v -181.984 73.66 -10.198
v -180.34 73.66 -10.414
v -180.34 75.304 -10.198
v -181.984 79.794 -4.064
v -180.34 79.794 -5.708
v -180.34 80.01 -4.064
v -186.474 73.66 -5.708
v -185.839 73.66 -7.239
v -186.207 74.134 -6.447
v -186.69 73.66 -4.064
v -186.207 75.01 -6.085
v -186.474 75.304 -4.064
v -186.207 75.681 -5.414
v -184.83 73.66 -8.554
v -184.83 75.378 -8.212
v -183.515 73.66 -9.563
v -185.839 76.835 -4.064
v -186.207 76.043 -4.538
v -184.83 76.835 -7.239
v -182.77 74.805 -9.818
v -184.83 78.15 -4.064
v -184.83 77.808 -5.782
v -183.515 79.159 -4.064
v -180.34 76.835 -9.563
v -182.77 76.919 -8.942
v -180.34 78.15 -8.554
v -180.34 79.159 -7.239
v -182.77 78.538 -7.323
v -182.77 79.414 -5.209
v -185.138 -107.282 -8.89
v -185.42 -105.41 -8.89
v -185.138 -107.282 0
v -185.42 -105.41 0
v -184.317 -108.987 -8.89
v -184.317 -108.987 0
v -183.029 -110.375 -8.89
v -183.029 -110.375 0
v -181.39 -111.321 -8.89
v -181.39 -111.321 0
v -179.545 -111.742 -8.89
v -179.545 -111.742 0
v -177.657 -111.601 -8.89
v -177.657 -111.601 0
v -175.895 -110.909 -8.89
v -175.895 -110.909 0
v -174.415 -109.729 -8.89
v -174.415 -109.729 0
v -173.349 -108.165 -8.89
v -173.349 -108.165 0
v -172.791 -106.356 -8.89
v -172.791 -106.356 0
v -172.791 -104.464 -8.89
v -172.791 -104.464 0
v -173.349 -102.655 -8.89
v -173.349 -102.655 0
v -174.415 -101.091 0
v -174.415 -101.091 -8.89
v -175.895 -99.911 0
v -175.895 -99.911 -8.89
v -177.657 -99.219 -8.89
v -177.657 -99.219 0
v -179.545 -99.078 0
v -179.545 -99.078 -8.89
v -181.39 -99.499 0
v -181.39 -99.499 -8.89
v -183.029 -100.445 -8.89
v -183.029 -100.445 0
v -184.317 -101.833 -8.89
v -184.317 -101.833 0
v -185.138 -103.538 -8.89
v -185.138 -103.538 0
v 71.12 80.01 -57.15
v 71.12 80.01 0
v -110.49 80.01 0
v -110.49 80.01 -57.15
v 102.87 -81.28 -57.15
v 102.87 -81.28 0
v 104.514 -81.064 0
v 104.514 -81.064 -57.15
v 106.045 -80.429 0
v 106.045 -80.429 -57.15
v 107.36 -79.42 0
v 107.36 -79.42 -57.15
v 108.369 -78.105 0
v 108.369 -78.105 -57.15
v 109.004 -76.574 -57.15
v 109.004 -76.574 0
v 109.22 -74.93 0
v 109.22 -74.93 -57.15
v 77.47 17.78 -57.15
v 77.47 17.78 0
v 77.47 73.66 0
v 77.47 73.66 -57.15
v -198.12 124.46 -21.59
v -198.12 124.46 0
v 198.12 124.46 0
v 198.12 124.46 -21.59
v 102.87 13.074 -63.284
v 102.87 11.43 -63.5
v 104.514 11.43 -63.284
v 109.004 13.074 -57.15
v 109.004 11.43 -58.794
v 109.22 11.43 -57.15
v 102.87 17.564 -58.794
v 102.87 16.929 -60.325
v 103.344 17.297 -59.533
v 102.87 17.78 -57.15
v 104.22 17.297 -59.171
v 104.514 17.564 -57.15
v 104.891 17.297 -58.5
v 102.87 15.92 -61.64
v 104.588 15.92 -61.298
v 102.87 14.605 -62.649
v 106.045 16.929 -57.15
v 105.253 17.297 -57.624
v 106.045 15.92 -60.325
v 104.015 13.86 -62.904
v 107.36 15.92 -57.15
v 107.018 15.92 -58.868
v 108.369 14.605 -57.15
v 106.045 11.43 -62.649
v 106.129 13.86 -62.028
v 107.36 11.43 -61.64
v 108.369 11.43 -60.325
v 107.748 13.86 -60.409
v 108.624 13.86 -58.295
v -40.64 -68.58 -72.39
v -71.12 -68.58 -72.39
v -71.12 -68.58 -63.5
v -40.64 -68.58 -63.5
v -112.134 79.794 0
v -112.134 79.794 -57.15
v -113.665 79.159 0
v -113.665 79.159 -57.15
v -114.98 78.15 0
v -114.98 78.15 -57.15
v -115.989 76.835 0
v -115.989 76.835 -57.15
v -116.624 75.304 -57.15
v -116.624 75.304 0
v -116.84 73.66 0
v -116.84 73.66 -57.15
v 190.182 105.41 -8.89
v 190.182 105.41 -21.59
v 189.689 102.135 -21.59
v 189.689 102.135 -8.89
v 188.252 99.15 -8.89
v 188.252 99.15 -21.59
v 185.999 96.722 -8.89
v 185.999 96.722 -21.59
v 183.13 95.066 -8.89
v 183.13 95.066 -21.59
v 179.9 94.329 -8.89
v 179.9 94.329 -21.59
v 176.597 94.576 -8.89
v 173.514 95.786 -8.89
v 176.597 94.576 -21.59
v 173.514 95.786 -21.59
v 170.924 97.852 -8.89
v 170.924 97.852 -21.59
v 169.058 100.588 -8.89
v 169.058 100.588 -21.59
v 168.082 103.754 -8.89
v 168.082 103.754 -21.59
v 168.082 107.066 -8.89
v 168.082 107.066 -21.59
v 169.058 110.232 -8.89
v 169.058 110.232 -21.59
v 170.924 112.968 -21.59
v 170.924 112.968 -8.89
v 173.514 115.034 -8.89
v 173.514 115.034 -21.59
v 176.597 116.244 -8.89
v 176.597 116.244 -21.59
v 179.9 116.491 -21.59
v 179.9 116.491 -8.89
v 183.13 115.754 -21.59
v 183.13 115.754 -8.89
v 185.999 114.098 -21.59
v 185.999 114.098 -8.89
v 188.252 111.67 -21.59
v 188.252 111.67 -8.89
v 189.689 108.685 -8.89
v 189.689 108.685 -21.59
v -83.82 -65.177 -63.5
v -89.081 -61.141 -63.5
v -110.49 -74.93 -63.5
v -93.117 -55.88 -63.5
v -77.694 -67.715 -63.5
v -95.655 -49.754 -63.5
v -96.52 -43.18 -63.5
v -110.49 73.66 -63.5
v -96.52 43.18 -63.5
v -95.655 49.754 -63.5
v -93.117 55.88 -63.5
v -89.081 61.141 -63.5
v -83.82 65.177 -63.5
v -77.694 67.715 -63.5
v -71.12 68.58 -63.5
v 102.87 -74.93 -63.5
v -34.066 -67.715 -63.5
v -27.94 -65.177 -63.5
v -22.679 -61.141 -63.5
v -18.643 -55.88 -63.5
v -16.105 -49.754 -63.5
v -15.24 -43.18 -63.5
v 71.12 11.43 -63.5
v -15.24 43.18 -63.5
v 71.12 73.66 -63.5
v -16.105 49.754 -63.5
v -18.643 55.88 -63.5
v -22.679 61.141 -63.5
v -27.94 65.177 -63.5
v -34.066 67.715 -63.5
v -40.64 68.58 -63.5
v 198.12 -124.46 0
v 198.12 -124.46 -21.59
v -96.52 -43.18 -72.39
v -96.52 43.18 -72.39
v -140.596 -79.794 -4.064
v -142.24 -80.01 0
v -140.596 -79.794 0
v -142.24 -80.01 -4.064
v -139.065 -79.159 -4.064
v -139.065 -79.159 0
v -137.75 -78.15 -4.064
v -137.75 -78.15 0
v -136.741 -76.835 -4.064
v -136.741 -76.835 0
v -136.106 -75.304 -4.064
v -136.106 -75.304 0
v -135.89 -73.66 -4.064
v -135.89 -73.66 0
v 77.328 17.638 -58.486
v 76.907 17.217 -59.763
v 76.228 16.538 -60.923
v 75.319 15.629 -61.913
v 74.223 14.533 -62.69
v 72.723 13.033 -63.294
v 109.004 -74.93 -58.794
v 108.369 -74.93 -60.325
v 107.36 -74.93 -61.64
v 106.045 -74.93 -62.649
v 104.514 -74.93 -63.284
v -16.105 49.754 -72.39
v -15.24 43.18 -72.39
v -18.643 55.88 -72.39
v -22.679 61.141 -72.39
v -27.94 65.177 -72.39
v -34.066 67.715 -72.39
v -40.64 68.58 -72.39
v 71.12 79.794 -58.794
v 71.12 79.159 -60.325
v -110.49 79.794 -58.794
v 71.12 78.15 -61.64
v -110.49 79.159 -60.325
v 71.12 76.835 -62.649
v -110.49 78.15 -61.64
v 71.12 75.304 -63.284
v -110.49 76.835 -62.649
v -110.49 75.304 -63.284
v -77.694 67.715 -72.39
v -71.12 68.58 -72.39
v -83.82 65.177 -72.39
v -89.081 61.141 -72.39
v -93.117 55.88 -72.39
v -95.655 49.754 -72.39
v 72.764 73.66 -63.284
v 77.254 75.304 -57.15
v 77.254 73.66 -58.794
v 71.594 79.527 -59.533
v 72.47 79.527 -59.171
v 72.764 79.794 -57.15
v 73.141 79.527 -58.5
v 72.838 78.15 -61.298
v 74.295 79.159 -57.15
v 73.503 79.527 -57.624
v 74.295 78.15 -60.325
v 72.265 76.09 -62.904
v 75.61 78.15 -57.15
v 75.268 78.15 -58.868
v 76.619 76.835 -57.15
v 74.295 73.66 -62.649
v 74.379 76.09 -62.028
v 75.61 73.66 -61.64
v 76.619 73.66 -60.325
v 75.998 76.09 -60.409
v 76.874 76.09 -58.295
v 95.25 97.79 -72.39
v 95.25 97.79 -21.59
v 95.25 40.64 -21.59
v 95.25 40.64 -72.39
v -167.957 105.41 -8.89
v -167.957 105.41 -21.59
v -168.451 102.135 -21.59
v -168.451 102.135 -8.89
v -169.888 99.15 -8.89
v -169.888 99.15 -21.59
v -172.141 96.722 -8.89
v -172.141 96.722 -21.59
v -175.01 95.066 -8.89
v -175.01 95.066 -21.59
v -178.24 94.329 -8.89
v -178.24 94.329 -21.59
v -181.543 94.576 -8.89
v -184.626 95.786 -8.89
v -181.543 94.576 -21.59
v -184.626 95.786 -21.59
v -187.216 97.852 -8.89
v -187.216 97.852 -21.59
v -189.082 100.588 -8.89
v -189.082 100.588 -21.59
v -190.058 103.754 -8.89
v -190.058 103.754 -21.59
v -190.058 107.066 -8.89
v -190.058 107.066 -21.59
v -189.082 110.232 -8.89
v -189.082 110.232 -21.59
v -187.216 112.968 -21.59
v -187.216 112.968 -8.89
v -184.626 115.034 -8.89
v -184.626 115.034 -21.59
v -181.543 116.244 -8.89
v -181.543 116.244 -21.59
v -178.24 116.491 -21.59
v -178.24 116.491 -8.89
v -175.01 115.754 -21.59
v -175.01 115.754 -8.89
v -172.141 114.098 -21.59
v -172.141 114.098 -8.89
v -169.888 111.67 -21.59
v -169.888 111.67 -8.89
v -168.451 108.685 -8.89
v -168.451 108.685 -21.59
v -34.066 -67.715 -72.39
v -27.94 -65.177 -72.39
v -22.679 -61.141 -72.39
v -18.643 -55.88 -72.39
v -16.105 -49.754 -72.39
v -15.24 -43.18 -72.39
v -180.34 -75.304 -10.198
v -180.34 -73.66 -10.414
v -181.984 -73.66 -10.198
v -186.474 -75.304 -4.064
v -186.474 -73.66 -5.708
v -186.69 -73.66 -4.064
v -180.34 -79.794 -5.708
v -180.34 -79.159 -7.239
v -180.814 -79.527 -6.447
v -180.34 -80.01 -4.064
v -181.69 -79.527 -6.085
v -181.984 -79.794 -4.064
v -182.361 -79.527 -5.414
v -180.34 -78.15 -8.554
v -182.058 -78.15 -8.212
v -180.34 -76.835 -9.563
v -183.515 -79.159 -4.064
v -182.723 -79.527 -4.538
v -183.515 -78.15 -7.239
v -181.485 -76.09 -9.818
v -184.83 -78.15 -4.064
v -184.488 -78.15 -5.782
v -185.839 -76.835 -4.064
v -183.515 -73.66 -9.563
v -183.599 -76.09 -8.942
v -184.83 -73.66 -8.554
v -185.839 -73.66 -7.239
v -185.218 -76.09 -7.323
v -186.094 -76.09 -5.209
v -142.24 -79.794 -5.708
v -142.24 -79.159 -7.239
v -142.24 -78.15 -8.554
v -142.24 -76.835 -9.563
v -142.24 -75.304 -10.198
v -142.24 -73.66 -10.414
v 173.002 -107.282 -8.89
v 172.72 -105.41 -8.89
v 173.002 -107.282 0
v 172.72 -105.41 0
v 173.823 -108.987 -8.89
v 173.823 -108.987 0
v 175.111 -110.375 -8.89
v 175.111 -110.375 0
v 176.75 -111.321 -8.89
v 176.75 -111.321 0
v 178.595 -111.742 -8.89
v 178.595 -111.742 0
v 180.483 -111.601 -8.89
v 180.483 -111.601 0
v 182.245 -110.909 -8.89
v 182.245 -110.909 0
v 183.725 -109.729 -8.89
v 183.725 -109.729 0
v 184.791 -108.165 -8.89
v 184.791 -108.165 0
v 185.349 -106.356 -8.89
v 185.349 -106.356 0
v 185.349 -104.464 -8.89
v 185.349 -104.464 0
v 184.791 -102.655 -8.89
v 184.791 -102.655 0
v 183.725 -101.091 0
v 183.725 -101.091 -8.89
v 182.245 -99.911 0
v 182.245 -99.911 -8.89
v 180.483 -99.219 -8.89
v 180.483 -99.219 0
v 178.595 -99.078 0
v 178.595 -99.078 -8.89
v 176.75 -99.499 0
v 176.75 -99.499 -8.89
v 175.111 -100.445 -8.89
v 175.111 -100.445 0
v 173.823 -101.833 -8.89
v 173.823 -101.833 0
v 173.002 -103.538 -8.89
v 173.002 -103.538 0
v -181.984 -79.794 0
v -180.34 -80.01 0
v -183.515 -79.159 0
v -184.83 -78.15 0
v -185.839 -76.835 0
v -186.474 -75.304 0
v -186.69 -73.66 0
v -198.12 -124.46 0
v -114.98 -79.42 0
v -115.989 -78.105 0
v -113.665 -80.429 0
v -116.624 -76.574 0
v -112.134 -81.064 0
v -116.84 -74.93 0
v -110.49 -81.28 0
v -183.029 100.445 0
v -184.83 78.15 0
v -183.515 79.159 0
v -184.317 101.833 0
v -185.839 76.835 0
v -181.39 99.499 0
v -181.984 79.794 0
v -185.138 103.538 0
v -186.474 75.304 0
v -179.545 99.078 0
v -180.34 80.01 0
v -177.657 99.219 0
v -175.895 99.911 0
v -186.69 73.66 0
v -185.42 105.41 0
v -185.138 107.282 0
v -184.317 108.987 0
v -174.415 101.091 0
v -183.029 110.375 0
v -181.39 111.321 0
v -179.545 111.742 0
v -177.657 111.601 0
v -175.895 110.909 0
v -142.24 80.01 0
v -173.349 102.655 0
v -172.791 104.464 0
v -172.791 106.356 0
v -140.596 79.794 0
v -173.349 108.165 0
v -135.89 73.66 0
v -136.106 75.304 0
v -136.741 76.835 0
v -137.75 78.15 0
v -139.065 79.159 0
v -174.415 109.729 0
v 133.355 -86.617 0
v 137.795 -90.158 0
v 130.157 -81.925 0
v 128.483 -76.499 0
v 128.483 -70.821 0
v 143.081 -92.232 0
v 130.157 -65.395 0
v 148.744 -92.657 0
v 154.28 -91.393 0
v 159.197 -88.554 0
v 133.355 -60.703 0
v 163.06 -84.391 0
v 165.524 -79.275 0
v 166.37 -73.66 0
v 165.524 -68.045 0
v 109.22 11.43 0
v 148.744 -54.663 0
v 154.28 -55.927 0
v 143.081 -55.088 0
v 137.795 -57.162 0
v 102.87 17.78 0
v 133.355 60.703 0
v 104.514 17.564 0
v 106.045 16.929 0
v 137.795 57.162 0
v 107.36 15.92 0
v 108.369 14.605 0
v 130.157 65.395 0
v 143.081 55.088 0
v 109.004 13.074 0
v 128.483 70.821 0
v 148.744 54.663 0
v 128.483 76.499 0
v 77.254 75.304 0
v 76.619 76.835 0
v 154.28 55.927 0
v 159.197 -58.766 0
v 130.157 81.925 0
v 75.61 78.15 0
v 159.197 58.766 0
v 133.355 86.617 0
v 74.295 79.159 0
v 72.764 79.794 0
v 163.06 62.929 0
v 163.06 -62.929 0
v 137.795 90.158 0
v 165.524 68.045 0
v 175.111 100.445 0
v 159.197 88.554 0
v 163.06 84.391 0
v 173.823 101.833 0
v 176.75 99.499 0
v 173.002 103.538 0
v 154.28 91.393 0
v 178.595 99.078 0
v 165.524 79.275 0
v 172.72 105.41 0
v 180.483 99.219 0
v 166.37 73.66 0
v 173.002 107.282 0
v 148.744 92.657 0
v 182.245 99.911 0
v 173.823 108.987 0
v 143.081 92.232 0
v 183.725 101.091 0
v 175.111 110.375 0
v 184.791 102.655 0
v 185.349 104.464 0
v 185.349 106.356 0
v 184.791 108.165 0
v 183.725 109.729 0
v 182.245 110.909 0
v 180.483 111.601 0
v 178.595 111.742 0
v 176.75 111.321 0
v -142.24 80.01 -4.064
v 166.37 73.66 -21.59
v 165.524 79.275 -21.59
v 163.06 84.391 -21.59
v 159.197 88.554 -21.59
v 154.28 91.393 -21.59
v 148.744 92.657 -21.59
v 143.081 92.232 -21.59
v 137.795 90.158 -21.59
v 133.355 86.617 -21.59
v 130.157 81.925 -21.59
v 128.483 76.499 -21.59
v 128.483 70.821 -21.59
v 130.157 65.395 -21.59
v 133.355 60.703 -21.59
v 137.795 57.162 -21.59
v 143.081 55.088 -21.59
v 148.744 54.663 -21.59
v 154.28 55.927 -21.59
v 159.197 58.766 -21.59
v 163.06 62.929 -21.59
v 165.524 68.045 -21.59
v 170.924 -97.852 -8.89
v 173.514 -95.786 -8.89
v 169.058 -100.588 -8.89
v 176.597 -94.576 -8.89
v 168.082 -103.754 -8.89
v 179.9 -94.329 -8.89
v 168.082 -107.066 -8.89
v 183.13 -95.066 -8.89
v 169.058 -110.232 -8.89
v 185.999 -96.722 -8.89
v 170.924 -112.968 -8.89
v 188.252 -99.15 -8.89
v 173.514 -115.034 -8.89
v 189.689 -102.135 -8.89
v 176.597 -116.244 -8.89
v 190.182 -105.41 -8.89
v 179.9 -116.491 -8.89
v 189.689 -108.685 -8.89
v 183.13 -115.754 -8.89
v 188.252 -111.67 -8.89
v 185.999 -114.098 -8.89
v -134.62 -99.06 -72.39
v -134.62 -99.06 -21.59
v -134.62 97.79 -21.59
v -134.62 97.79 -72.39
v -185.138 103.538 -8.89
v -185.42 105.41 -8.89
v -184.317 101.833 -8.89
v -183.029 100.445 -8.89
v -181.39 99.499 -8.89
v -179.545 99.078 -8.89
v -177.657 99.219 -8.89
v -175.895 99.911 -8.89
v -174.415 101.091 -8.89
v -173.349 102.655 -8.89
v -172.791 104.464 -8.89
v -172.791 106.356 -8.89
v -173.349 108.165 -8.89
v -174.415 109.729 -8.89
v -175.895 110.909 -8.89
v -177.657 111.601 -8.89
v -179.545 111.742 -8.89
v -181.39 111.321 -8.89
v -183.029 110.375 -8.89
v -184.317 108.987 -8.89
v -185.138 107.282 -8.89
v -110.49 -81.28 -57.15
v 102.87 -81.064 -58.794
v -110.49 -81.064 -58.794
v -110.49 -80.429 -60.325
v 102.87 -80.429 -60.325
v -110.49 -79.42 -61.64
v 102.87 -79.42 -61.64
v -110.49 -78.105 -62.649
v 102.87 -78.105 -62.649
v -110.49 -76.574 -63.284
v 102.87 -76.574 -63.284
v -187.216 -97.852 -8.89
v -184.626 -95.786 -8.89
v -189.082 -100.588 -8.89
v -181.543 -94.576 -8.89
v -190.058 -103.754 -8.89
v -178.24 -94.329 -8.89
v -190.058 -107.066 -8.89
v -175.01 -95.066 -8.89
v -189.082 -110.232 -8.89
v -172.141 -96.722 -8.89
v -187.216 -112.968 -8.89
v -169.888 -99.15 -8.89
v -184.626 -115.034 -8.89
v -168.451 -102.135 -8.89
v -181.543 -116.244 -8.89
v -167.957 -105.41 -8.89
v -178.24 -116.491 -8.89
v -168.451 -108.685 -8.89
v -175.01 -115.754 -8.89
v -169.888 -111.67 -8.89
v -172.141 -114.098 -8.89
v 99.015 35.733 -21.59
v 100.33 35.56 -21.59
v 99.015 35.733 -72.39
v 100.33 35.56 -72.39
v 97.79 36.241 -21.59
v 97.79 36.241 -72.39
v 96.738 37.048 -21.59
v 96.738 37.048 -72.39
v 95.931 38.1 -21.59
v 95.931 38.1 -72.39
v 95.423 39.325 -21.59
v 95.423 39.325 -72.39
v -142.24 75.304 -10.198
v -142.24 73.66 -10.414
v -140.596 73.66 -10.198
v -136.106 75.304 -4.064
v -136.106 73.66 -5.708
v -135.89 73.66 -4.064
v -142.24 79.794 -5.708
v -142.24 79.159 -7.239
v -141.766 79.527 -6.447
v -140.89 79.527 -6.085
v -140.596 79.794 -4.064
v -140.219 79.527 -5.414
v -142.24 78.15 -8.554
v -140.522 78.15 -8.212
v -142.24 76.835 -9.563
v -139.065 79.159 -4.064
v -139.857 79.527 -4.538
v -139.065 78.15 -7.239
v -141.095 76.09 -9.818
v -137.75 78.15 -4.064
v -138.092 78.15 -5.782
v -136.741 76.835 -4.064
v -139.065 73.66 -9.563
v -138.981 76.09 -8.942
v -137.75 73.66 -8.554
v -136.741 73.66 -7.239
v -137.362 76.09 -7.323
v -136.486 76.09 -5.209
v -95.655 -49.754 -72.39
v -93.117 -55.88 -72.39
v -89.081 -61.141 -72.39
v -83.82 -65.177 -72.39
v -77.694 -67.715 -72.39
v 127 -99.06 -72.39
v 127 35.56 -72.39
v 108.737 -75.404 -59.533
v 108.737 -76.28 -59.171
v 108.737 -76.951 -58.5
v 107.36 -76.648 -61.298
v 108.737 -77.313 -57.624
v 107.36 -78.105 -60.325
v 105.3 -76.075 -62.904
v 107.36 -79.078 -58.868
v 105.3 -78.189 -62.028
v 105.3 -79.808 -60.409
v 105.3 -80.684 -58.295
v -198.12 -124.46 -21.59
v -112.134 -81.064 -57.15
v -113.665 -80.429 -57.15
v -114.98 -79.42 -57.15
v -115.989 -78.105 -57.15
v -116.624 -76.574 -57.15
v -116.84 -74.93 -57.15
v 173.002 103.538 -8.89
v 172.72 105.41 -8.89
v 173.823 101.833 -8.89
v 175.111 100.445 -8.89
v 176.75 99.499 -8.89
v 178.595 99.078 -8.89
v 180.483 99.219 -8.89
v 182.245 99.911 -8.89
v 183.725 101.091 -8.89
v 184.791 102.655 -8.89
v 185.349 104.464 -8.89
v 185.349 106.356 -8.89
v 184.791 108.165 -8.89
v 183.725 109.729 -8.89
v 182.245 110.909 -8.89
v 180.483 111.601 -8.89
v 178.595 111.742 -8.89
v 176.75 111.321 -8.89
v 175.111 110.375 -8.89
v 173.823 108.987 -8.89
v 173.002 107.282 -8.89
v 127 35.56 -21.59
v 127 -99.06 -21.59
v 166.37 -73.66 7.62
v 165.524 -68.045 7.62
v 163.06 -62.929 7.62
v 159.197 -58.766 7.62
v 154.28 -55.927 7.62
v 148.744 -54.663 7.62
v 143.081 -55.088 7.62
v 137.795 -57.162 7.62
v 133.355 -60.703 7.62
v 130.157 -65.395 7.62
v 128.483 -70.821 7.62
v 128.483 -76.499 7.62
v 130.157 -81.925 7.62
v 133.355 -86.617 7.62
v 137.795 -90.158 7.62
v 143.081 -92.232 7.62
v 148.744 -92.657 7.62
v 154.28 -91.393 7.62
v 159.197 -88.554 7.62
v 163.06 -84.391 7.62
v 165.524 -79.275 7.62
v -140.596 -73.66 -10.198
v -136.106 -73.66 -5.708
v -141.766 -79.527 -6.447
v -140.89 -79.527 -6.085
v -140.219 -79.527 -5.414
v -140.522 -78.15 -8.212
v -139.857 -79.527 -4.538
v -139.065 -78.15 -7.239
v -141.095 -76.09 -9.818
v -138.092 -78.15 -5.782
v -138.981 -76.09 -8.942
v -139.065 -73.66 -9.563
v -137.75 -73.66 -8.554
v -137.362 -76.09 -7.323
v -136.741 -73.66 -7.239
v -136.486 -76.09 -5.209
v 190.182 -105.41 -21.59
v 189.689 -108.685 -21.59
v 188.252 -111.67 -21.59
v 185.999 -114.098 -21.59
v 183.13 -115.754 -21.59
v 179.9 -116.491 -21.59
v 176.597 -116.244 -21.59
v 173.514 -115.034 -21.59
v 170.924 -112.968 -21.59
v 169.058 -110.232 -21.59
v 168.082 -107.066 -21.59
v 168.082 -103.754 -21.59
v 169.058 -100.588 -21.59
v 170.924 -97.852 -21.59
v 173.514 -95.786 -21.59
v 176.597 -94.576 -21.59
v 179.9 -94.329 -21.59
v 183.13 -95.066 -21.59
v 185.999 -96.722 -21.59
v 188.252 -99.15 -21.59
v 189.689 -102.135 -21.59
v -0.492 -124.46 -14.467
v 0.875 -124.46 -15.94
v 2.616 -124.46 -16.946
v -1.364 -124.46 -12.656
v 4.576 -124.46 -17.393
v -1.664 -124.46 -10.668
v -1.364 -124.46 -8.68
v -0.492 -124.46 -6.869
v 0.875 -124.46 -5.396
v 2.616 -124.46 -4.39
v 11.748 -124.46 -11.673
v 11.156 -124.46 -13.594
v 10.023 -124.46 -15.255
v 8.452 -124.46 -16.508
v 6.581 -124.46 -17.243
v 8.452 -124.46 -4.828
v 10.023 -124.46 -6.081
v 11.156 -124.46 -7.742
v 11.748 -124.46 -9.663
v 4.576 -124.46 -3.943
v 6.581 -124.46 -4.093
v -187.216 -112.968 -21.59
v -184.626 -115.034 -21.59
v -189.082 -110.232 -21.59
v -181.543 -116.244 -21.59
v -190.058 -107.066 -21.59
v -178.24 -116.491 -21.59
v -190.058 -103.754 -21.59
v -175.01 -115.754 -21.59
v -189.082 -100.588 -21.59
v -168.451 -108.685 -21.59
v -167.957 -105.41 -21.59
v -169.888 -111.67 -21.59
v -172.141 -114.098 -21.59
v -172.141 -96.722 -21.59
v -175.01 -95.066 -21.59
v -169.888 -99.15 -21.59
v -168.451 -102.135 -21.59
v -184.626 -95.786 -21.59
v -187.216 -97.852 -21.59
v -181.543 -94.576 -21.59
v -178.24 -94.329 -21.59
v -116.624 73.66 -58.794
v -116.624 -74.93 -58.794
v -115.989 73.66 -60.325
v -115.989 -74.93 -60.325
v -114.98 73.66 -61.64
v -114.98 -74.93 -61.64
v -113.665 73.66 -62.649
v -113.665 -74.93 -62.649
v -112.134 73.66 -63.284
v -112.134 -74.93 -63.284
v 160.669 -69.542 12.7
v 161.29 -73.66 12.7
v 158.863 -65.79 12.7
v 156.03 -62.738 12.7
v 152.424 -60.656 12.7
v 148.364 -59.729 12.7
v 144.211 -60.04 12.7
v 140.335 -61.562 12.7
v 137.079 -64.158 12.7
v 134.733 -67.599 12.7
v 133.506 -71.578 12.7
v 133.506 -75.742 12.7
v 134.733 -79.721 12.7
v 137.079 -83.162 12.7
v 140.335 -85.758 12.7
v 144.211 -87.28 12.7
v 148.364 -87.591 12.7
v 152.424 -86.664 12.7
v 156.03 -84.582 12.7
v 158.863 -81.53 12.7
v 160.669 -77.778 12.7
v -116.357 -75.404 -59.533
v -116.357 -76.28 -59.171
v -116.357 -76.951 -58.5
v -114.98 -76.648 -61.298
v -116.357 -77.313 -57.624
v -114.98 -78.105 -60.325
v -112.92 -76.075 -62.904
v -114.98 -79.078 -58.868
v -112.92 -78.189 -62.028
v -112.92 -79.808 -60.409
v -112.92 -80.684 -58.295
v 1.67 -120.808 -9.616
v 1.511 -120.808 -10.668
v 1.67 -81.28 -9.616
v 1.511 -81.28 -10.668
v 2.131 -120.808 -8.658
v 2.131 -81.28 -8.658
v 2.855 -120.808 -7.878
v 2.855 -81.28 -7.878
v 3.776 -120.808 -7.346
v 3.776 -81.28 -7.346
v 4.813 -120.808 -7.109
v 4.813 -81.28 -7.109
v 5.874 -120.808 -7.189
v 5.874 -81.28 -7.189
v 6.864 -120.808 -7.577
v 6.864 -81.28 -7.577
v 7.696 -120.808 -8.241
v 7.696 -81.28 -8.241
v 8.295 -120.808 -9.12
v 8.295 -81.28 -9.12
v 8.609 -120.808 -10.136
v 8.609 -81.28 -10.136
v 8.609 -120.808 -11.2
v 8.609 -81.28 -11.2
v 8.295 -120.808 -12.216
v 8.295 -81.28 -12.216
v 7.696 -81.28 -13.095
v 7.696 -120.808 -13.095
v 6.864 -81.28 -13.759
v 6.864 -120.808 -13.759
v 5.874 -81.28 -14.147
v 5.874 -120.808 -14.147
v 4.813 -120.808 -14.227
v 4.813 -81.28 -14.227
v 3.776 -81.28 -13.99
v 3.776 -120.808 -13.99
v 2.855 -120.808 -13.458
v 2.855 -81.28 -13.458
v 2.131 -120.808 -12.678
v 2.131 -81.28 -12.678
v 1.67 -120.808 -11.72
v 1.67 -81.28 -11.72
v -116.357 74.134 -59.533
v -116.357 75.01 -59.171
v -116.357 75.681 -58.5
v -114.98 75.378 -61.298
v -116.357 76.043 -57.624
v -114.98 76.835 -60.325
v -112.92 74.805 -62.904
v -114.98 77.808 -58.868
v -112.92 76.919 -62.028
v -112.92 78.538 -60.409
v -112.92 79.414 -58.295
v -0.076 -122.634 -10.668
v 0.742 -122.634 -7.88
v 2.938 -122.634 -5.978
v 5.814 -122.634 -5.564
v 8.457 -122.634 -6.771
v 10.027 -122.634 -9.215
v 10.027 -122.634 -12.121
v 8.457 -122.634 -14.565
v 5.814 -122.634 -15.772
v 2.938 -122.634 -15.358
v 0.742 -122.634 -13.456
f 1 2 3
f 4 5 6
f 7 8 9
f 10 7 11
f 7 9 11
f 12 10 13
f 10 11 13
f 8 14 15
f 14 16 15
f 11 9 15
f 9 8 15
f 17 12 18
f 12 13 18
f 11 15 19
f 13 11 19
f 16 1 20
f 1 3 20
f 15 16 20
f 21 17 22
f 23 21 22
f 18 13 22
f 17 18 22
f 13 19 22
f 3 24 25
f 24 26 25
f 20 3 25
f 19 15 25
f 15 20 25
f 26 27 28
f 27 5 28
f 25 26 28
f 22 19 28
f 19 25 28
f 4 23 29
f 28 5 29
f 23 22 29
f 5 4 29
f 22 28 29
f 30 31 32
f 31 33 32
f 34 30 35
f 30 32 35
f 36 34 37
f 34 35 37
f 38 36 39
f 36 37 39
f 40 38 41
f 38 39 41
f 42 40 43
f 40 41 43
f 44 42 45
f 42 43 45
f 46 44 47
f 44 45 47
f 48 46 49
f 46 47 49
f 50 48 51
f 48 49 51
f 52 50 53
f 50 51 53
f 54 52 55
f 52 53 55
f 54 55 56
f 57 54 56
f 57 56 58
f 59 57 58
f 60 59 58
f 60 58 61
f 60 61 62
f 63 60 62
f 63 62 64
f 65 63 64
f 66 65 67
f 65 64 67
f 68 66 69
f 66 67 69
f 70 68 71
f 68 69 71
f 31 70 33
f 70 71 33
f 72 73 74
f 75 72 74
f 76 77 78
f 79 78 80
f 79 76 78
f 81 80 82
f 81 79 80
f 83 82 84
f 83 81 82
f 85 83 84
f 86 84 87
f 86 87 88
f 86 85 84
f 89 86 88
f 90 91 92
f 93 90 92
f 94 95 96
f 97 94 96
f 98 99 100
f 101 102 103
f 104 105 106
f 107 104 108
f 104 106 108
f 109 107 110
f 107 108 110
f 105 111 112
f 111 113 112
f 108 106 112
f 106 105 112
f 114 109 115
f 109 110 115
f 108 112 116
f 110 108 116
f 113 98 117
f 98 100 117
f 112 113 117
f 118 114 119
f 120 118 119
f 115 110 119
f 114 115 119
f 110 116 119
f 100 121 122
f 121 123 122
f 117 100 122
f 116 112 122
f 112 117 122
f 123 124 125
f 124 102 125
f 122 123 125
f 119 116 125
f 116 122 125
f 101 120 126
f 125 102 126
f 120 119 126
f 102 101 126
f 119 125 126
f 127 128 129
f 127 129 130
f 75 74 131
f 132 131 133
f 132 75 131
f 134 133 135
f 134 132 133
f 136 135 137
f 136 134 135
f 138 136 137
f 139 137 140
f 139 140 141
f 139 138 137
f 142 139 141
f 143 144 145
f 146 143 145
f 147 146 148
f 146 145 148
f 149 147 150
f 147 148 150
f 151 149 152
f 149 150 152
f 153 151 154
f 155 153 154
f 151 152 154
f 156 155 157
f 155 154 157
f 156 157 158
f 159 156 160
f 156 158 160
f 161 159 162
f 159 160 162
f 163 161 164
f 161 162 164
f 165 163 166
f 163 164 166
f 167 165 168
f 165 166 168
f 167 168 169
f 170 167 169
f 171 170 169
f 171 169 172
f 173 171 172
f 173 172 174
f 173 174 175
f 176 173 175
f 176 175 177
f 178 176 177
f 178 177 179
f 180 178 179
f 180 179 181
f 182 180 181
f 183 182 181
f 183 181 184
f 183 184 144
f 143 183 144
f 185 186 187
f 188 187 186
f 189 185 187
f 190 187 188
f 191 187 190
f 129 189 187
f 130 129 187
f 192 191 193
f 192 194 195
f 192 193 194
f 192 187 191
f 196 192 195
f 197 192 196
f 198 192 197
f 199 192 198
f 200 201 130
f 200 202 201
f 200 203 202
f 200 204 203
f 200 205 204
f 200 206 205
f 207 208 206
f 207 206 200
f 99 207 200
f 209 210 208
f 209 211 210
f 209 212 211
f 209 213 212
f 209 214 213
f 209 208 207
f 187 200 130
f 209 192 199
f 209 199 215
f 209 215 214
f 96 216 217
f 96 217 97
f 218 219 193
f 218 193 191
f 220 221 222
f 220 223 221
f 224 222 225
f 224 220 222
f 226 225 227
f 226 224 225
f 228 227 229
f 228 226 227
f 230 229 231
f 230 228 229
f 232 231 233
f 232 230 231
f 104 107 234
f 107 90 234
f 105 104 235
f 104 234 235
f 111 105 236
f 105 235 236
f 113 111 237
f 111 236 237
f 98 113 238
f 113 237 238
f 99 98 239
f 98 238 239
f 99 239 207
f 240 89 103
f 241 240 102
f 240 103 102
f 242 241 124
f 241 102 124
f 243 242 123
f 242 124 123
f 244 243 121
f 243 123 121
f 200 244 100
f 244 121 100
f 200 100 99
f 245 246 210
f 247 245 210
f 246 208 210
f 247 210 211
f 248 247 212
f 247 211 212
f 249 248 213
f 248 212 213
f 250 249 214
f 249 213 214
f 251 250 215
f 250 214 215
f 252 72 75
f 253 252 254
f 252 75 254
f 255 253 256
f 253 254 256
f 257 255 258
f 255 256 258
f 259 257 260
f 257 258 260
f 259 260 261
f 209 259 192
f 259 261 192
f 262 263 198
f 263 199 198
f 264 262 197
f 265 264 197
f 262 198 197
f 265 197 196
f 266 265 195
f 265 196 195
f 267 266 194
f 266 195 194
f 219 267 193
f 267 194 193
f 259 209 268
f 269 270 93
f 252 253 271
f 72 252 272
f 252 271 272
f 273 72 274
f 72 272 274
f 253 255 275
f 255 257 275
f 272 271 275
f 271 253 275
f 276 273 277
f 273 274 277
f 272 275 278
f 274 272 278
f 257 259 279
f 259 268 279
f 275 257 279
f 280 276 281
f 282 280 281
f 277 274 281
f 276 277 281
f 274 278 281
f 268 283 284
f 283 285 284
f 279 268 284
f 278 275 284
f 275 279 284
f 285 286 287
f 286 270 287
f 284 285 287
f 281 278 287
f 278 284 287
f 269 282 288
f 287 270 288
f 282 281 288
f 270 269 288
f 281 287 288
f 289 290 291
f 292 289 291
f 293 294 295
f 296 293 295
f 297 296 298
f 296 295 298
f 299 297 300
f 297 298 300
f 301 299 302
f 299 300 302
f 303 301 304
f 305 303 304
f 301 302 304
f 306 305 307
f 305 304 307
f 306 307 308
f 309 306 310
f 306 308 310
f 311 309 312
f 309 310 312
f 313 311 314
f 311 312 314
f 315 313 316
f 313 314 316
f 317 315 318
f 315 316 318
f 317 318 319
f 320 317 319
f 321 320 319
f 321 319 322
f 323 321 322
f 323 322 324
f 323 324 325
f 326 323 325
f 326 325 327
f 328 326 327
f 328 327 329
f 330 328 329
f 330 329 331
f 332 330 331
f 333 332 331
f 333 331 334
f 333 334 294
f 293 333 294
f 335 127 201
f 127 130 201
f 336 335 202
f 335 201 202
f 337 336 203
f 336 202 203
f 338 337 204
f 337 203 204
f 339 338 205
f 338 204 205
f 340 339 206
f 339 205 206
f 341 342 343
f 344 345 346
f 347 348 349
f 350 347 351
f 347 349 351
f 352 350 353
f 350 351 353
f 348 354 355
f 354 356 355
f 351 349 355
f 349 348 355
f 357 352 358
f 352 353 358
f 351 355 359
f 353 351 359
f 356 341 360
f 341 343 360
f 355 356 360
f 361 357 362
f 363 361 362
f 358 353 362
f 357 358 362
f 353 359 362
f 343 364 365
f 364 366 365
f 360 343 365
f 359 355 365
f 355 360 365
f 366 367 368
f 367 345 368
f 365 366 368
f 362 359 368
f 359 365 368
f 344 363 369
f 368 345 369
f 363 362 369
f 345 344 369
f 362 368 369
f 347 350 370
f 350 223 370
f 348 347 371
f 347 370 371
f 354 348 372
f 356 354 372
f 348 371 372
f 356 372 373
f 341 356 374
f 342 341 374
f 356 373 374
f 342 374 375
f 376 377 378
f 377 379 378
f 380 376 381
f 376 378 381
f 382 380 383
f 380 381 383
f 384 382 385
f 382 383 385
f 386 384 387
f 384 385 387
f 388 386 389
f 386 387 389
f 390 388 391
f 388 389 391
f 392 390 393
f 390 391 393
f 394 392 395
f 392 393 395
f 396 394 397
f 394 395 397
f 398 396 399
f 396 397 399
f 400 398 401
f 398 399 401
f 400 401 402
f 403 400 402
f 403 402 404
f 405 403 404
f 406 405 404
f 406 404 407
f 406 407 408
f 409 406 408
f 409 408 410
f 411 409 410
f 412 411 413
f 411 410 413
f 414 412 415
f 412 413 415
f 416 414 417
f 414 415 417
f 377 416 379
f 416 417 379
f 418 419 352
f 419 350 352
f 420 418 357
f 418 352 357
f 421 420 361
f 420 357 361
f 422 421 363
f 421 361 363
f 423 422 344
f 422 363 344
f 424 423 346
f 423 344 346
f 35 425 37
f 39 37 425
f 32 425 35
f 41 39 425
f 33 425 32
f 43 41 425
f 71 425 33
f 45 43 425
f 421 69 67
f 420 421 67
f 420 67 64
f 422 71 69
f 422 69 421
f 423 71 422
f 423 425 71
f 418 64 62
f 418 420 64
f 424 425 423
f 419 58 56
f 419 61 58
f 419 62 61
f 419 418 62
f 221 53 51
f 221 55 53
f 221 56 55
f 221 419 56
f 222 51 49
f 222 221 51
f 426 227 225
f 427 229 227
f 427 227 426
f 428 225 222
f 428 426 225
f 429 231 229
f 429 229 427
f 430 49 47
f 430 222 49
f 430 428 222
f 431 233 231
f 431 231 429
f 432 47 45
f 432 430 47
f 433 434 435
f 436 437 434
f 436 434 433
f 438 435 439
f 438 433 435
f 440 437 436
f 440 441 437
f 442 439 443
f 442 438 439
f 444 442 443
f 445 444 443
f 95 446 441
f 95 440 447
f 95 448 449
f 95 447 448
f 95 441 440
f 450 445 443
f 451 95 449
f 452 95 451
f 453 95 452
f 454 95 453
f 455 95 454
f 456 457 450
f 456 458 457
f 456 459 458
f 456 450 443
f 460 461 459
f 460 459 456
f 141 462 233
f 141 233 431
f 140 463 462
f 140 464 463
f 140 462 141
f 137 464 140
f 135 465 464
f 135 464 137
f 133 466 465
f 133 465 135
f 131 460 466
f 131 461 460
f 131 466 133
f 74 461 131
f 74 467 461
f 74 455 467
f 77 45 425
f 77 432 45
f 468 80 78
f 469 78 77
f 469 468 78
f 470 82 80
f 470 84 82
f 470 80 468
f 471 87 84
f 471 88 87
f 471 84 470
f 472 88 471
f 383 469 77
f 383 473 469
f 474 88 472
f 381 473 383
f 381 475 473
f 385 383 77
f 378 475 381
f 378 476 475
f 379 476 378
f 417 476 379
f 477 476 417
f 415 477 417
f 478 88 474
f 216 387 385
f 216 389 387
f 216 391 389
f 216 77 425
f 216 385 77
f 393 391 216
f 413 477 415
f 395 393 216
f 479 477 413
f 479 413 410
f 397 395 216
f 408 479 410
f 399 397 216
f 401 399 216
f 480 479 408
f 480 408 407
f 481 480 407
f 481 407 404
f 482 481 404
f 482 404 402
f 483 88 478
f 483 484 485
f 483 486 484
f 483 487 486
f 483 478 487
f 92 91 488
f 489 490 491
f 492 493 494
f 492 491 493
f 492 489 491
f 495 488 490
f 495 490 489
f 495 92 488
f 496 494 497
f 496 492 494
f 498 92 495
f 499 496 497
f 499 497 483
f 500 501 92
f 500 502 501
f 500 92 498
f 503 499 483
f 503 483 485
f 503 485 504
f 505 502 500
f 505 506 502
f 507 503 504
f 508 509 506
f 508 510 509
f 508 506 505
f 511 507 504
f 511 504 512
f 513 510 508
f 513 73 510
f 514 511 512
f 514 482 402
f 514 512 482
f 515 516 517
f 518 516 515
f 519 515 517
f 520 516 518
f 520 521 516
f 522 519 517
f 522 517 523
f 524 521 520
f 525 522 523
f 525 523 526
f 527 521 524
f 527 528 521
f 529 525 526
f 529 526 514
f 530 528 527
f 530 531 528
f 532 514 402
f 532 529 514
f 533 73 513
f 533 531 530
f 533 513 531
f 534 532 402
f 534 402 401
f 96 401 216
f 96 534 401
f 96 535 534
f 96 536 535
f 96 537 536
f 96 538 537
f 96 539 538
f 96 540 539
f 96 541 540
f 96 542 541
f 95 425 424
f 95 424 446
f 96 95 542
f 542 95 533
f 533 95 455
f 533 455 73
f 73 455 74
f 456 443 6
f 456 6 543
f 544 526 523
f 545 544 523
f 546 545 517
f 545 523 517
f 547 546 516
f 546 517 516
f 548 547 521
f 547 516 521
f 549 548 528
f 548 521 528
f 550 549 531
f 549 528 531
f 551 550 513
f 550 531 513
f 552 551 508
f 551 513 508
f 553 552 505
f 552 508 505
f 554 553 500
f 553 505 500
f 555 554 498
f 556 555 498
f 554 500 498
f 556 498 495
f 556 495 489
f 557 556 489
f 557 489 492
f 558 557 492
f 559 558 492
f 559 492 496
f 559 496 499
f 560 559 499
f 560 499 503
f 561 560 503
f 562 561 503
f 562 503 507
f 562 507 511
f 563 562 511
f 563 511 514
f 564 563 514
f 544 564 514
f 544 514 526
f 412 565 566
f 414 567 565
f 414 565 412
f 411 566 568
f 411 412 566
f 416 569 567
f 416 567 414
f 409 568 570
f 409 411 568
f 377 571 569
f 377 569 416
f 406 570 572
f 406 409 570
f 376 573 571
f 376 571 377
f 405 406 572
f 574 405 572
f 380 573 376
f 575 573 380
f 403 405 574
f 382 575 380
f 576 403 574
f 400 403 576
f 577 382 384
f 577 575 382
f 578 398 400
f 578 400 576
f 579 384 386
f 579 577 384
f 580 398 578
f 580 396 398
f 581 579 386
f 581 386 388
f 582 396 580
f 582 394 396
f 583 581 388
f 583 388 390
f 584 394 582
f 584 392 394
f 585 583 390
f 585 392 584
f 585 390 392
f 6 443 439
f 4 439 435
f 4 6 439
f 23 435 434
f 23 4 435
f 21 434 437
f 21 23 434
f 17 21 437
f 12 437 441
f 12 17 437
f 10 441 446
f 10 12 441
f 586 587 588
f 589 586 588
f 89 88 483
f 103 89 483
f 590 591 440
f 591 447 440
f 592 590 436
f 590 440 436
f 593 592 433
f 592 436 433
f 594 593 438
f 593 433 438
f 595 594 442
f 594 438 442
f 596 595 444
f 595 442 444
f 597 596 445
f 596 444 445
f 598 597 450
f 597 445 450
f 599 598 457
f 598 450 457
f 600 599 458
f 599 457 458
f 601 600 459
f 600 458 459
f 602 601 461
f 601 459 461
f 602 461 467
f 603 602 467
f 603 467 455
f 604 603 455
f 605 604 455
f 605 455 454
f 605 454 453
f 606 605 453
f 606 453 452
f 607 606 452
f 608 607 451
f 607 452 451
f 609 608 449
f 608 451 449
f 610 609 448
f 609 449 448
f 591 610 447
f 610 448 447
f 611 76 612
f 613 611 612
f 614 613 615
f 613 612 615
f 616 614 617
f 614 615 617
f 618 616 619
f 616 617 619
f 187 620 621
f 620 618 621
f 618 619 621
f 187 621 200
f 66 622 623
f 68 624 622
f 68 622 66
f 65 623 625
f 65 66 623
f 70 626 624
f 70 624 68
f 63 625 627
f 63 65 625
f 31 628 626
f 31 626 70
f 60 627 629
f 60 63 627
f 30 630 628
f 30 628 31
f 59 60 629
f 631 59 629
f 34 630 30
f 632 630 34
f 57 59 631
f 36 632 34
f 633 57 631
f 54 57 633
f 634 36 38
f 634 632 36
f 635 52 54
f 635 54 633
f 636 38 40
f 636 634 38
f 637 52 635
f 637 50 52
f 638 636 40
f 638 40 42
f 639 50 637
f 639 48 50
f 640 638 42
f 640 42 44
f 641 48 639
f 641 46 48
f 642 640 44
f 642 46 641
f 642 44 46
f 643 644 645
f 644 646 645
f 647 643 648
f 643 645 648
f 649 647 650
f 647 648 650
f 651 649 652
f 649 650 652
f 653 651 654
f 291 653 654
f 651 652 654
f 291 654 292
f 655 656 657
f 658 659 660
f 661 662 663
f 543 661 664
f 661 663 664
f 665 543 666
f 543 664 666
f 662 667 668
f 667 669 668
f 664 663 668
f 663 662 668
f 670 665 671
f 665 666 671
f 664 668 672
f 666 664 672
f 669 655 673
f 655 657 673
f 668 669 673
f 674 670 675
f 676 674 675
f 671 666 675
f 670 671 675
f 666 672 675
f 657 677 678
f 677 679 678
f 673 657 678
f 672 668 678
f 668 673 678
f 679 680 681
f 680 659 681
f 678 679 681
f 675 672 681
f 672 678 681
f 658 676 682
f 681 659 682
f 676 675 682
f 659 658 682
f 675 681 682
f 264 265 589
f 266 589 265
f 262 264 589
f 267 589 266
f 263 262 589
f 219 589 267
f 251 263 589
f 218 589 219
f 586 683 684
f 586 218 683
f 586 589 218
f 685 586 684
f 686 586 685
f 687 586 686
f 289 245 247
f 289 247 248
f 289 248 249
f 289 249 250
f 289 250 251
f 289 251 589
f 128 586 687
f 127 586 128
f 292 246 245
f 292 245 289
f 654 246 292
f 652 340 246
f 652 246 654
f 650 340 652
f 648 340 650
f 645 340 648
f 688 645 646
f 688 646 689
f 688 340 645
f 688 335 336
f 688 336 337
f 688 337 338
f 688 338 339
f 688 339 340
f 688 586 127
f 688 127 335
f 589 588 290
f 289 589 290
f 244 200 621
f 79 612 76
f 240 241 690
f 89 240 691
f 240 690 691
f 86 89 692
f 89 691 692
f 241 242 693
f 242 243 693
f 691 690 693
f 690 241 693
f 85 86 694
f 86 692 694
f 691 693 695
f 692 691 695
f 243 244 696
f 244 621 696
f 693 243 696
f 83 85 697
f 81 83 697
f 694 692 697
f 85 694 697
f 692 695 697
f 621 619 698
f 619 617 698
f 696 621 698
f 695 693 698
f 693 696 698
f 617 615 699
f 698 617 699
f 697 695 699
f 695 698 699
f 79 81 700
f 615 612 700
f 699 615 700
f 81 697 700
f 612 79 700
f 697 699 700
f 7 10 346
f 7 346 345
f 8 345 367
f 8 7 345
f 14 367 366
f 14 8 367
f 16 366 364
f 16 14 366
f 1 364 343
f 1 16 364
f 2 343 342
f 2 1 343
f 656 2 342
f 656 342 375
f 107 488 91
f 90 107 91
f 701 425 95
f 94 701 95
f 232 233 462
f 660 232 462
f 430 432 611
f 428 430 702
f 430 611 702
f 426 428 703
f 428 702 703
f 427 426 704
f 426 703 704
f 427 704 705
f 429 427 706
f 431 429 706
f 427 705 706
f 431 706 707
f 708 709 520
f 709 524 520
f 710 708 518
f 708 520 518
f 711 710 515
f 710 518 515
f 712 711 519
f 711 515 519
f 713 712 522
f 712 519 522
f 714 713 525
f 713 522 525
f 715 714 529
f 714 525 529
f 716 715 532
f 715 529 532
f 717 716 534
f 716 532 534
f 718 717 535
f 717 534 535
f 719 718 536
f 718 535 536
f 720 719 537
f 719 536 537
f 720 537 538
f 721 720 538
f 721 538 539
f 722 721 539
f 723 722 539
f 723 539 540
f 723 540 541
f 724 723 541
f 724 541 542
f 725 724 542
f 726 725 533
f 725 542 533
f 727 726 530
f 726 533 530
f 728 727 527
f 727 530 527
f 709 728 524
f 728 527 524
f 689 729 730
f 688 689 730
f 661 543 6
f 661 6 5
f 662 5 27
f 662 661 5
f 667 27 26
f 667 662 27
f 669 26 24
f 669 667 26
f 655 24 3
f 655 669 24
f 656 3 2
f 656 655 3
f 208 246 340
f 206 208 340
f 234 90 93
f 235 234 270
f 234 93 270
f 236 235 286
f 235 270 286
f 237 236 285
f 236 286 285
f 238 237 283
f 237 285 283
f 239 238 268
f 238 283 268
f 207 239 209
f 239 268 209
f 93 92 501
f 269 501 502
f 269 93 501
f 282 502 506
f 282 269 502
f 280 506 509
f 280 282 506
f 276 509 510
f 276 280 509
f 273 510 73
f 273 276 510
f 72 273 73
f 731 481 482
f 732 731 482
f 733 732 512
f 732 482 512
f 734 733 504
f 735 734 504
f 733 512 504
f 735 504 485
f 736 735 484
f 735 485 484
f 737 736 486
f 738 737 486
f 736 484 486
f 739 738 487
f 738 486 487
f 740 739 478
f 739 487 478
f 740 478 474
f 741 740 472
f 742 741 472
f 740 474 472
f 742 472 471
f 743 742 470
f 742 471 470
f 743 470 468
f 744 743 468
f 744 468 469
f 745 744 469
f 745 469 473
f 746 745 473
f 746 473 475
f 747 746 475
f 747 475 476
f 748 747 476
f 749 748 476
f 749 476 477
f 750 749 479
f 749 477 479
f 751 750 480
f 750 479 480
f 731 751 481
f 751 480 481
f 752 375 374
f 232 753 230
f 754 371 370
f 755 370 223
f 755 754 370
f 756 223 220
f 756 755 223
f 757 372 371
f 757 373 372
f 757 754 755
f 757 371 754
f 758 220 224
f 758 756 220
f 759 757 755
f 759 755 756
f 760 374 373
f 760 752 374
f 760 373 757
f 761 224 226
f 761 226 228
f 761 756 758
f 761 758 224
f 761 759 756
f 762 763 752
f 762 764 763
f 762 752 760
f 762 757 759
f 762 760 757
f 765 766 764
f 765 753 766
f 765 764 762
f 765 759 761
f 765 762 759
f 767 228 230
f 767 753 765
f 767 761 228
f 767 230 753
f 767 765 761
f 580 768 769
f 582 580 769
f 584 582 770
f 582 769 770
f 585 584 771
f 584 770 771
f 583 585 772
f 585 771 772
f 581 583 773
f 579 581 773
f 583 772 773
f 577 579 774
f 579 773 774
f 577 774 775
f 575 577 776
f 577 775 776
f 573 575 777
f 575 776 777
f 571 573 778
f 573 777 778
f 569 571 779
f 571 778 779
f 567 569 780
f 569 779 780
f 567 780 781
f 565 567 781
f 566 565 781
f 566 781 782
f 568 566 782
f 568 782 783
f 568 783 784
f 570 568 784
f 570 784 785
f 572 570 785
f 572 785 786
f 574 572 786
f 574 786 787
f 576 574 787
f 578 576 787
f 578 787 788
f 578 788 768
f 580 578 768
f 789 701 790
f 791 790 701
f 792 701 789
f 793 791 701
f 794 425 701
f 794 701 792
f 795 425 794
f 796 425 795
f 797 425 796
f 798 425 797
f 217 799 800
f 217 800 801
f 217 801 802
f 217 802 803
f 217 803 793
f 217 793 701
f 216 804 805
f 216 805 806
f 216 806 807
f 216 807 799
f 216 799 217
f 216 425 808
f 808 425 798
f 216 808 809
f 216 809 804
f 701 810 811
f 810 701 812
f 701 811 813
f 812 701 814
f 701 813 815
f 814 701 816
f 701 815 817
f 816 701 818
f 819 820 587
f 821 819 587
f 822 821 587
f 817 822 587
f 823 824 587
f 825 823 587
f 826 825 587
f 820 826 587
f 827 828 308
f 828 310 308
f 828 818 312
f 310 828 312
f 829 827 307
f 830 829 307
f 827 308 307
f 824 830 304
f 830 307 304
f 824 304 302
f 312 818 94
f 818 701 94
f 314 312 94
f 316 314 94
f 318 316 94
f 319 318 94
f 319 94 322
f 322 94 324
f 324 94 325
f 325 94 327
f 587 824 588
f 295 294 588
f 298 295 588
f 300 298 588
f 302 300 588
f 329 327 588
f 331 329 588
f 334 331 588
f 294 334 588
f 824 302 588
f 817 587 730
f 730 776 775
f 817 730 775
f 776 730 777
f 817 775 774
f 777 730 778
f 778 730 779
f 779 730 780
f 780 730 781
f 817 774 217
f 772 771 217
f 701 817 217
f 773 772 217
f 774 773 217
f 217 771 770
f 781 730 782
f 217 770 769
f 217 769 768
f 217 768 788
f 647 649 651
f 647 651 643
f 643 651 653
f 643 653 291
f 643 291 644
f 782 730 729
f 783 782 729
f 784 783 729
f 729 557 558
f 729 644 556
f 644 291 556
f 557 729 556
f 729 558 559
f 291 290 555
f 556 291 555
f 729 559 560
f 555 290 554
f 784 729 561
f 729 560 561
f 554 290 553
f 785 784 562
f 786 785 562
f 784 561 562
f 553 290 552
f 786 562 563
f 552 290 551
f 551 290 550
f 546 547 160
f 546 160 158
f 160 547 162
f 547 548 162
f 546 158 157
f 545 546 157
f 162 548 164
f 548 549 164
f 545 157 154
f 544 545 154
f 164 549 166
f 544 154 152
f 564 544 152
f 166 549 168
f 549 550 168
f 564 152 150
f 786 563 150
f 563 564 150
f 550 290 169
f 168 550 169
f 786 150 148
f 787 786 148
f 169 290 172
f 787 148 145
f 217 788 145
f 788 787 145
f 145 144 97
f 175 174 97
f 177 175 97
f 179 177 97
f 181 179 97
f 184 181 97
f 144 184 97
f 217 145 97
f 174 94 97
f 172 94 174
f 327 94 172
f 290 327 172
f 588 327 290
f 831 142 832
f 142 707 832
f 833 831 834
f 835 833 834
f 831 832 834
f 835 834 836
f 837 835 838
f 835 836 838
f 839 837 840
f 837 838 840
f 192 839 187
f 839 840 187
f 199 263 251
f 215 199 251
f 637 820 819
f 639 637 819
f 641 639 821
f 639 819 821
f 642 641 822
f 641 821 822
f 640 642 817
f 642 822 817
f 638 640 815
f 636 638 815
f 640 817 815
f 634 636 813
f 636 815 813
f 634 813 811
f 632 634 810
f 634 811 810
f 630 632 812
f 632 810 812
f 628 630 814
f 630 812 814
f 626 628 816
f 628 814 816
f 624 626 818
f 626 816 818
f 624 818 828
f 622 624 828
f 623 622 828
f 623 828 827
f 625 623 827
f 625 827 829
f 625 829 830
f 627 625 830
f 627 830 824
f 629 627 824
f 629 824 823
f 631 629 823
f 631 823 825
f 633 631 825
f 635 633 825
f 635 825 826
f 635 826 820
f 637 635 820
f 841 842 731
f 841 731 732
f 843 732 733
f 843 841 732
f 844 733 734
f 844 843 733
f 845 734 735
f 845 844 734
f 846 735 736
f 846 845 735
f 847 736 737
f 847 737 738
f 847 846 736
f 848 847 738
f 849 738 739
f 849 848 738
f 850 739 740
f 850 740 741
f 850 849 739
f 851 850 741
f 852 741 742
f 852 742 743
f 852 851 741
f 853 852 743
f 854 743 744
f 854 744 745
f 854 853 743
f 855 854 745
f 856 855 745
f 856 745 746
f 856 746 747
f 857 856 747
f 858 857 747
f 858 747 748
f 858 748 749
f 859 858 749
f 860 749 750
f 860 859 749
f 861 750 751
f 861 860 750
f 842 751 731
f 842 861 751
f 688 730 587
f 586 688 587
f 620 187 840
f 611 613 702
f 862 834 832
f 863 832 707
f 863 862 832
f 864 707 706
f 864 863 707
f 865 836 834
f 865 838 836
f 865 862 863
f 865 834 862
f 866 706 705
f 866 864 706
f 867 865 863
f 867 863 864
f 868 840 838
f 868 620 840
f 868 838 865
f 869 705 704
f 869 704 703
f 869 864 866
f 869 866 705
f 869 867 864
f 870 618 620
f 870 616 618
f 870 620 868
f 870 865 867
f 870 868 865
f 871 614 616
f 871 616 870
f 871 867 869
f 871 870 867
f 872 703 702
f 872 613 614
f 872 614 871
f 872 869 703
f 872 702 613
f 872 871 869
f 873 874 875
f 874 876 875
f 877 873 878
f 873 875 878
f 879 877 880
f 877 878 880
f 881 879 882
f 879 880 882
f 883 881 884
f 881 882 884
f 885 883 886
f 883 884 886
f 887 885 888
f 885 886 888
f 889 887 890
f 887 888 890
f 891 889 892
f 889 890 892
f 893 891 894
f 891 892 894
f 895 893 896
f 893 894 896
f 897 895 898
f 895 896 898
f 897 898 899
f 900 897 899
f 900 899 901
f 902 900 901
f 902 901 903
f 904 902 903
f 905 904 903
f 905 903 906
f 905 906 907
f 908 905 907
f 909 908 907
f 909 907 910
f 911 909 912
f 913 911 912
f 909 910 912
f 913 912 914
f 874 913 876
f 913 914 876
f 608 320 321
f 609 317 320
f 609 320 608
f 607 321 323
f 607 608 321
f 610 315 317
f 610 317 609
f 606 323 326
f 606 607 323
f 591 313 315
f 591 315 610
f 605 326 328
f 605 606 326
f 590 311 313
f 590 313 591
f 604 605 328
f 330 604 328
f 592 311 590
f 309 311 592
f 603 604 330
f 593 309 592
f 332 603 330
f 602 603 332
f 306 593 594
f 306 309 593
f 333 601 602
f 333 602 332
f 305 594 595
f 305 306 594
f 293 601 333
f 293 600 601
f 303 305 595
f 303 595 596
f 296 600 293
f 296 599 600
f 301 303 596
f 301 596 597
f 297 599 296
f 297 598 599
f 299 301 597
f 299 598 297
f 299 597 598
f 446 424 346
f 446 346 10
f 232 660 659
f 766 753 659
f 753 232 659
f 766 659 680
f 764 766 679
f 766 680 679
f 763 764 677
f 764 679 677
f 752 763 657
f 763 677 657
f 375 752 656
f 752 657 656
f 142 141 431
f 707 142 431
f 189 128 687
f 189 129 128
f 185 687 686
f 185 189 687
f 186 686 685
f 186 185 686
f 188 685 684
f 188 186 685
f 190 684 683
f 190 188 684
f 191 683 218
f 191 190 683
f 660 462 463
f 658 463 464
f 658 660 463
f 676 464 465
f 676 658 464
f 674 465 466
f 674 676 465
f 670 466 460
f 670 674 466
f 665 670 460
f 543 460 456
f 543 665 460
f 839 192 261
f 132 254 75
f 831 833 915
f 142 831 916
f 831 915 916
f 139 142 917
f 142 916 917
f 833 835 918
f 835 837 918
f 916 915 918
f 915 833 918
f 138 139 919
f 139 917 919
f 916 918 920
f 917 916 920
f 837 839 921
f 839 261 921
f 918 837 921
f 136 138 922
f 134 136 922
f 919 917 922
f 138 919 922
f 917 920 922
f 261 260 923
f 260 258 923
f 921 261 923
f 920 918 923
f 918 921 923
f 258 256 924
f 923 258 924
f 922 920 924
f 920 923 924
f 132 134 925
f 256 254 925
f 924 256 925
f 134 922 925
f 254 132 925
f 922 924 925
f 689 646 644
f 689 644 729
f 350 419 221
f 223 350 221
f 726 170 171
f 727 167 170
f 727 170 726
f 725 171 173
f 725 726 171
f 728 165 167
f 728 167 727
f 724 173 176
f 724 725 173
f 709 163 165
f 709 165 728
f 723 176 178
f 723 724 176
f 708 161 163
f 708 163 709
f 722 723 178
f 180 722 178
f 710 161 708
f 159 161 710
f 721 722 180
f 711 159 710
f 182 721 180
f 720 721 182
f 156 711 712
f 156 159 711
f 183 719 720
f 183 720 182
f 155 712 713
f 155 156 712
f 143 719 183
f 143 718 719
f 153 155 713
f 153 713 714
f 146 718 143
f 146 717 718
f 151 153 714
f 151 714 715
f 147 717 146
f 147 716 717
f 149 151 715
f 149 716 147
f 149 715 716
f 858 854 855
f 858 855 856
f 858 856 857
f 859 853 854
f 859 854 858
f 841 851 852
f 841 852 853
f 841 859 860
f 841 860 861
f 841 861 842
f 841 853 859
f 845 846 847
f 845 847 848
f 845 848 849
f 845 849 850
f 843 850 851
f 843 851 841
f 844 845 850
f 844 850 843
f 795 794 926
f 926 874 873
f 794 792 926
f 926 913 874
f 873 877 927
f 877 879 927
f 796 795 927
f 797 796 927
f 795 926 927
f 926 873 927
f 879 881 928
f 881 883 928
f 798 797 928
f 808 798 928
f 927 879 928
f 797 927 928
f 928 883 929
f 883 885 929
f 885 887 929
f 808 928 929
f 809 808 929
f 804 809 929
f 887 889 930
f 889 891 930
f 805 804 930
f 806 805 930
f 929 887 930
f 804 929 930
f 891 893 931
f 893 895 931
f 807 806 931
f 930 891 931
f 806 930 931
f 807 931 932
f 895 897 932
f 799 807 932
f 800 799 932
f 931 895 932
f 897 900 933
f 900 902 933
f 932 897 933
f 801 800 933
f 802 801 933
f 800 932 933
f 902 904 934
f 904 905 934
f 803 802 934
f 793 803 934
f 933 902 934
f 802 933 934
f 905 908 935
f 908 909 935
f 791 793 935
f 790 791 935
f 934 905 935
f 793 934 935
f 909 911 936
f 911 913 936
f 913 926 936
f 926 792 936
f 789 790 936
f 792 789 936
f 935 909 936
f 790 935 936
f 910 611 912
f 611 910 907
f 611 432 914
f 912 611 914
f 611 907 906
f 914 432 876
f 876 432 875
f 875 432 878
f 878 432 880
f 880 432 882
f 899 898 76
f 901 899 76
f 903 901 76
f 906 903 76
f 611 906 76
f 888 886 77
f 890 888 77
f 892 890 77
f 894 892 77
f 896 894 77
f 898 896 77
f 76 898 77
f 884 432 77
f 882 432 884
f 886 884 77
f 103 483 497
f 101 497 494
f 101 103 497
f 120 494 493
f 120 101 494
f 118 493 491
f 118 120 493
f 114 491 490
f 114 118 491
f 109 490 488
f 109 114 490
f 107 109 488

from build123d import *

# Parameters (mm, degrees)
F0_W            = 396.24
F0_H            = 248.92
F1_DEPTH        = 21.59
F3_DEPTH        = 50.8
F5_DEPTH        = 63.5
F6_R            = 6.35
F7_R            = 5.08
F8_W            = 81.28
F8_H            = 137.16
F9_DEPTH        = 72.391
F10_W           = 50.8
F10_H           = 160.02
F11_DEPTH       = 10.414
F12_R           = 6.35
F13_R           = 19.05
F14_DEPTH       = 12.7
F15_SIZE        = 5.08
F17_D           = 7.1374
F17_DEPTH       = 127
F17_CSINK_D     = 13.4874
F17_CSINK_ANGLE = 82
F17_TIP         = 2.1442912911
F19_D           = 12.7
F19_CBORE_D     = 22.225
F19_CBORE_DEPTH = 12.7
F20_R           = 19.05
F21_DEPTH       = 72.391
F22_R           = 25.4


with BuildPart() as f1:
    # F0 (on Top) → F1 (new body)
    with BuildSketch(Plane.XY):
        Rectangle(F0_W, F0_H)
    extrude(amount=-F1_DEPTH)

    # F2 (on face) → F3 (join)
    with BuildSketch(Plane(origin=(0, 0, -21.59), x_dir=(1, 0, 0), z_dir=(0, 0, -1))):
        Polygon((127, 99.06), (-134.62, 99.06), (-134.62, -97.79), (95.25, -97.79), (95.25, -35.56), (127, -35.56), align=None)
    extrude(amount=F3_DEPTH)

    # F4 (on face) → F5 (cut)
    with BuildSketch(Plane.XY):
        Polygon((-116.84, -81.28), (109.22, -81.28), (109.22, 17.78), (77.47, 17.78), (77.47, 80.01), (-116.84, 80.01), align=None)
    extrude(amount=-F5_DEPTH, mode=Mode.SUBTRACT)

    # F6
    f6_edges = [f1.edges().sort_by_distance(p)[0] for p in [
        (-3.81, -81.28, -63.5),
        (109.22, -31.75, -63.5),
        (93.345, 17.78, -63.5),
        (77.47, 48.895, -63.5),
        (-19.685, 80.01, -63.5),
        (-116.84, -0.635, -63.5),
        (109.22, -81.28, -31.75),
        (-116.84, -81.28, -31.75),
        (-116.84, 80.01, -31.75),
        (109.22, 17.78, -31.75),
        (77.47, 80.01, -31.75),
    ]]
    fillet(f6_edges, radius=F6_R)

    # F7
    f7_edges = [f1.edges().sort_by_distance(p)[0] for p in [
        (95.25, 35.56, -46.99),
    ]]
    fillet(f7_edges, radius=F7_R)

    # F8 (on face) → F9 (cut, through all)
    with BuildSketch(Plane(origin=(0, 0, -72.39), x_dir=(1, 0, 0), z_dir=(0, 0, -1))):
        with Locations((-55.88, 0)):
            Rectangle(F8_W, F8_H)
    extrude(amount=-F9_DEPTH, mode=Mode.SUBTRACT)

    # F10 (on face) → F11 (cut)
    with BuildSketch(Plane.XY):
        with Locations((-161.29, 0)):
            Rectangle(F10_W, F10_H)
    extrude(amount=-F11_DEPTH, mode=Mode.SUBTRACT)

    # F12
    f12_edges = [f1.edges().sort_by_distance(p)[0] for p in [
        (-135.89, 0, -10.414),
        (-161.29, 80.01, -10.414),
        (-186.69, 0, -10.414),
        (-161.29, -80.01, -10.414),
        (-186.69, 80.01, -5.207),
        (-135.89, 80.01, -5.207),
        (-135.89, -80.01, -5.207),
        (-186.69, -80.01, -5.207),
    ]]
    fillet(f12_edges, radius=F12_R)

    # F13 (on face) → F14 (join)
    with BuildSketch(Plane.XY):
        with Locations((147.32, -73.66)):
            Circle(F13_R)
    extrude(amount=F14_DEPTH)

    # F15
    f15_edges = [f1.edges().sort_by_distance(p)[0] for p in [
        (128.27, -73.66, 12.7),
    ]]
    chamfer(f15_edges, length=F15_SIZE)

    # F17
    with Locations(Plane.XZ.offset(124.46)):
        with Locations((5.08, -10.668)):
            CounterSinkHole(F17_D / 2, F17_CSINK_D / 2, depth=F17_DEPTH, counter_sink_angle=F17_CSINK_ANGLE)
            with Locations((0, 0, -(F17_DEPTH + F17_TIP / 2))):  # 118° drill point
                Cone(0, F17_D / 2, F17_TIP, mode=Mode.SUBTRACT)

    # F19 (through all)
    with Locations(Plane(origin=(0, 0, -21.59), x_dir=(1, 0, 0), z_dir=(0, 0, -1))):
        with Locations((-179.07, 105.41), (179.07, 105.41), (179.07, -105.41), (-179.07, -105.41)):
            CounterBoreHole(F19_D / 2, F19_CBORE_D / 2, F19_CBORE_DEPTH)

    # F20 (on face) → F21 (cut, through all)
    with BuildSketch(Plane.XY):
        with Locations((147.32, 73.66)):
            Circle(F20_R)
    extrude(amount=-F21_DEPTH, mode=Mode.SUBTRACT)

    # F22
    f22_edges = [f1.edges().sort_by_distance(p)[0] for p in [
        (-15.24, -68.58, -67.945),
        (-15.24, 68.58, -67.945),
        (-96.52, 68.58, -67.945),
        (-96.52, -68.58, -67.945),
    ]]
    fillet(f22_edges, radius=F22_R)


solid = f1.part
